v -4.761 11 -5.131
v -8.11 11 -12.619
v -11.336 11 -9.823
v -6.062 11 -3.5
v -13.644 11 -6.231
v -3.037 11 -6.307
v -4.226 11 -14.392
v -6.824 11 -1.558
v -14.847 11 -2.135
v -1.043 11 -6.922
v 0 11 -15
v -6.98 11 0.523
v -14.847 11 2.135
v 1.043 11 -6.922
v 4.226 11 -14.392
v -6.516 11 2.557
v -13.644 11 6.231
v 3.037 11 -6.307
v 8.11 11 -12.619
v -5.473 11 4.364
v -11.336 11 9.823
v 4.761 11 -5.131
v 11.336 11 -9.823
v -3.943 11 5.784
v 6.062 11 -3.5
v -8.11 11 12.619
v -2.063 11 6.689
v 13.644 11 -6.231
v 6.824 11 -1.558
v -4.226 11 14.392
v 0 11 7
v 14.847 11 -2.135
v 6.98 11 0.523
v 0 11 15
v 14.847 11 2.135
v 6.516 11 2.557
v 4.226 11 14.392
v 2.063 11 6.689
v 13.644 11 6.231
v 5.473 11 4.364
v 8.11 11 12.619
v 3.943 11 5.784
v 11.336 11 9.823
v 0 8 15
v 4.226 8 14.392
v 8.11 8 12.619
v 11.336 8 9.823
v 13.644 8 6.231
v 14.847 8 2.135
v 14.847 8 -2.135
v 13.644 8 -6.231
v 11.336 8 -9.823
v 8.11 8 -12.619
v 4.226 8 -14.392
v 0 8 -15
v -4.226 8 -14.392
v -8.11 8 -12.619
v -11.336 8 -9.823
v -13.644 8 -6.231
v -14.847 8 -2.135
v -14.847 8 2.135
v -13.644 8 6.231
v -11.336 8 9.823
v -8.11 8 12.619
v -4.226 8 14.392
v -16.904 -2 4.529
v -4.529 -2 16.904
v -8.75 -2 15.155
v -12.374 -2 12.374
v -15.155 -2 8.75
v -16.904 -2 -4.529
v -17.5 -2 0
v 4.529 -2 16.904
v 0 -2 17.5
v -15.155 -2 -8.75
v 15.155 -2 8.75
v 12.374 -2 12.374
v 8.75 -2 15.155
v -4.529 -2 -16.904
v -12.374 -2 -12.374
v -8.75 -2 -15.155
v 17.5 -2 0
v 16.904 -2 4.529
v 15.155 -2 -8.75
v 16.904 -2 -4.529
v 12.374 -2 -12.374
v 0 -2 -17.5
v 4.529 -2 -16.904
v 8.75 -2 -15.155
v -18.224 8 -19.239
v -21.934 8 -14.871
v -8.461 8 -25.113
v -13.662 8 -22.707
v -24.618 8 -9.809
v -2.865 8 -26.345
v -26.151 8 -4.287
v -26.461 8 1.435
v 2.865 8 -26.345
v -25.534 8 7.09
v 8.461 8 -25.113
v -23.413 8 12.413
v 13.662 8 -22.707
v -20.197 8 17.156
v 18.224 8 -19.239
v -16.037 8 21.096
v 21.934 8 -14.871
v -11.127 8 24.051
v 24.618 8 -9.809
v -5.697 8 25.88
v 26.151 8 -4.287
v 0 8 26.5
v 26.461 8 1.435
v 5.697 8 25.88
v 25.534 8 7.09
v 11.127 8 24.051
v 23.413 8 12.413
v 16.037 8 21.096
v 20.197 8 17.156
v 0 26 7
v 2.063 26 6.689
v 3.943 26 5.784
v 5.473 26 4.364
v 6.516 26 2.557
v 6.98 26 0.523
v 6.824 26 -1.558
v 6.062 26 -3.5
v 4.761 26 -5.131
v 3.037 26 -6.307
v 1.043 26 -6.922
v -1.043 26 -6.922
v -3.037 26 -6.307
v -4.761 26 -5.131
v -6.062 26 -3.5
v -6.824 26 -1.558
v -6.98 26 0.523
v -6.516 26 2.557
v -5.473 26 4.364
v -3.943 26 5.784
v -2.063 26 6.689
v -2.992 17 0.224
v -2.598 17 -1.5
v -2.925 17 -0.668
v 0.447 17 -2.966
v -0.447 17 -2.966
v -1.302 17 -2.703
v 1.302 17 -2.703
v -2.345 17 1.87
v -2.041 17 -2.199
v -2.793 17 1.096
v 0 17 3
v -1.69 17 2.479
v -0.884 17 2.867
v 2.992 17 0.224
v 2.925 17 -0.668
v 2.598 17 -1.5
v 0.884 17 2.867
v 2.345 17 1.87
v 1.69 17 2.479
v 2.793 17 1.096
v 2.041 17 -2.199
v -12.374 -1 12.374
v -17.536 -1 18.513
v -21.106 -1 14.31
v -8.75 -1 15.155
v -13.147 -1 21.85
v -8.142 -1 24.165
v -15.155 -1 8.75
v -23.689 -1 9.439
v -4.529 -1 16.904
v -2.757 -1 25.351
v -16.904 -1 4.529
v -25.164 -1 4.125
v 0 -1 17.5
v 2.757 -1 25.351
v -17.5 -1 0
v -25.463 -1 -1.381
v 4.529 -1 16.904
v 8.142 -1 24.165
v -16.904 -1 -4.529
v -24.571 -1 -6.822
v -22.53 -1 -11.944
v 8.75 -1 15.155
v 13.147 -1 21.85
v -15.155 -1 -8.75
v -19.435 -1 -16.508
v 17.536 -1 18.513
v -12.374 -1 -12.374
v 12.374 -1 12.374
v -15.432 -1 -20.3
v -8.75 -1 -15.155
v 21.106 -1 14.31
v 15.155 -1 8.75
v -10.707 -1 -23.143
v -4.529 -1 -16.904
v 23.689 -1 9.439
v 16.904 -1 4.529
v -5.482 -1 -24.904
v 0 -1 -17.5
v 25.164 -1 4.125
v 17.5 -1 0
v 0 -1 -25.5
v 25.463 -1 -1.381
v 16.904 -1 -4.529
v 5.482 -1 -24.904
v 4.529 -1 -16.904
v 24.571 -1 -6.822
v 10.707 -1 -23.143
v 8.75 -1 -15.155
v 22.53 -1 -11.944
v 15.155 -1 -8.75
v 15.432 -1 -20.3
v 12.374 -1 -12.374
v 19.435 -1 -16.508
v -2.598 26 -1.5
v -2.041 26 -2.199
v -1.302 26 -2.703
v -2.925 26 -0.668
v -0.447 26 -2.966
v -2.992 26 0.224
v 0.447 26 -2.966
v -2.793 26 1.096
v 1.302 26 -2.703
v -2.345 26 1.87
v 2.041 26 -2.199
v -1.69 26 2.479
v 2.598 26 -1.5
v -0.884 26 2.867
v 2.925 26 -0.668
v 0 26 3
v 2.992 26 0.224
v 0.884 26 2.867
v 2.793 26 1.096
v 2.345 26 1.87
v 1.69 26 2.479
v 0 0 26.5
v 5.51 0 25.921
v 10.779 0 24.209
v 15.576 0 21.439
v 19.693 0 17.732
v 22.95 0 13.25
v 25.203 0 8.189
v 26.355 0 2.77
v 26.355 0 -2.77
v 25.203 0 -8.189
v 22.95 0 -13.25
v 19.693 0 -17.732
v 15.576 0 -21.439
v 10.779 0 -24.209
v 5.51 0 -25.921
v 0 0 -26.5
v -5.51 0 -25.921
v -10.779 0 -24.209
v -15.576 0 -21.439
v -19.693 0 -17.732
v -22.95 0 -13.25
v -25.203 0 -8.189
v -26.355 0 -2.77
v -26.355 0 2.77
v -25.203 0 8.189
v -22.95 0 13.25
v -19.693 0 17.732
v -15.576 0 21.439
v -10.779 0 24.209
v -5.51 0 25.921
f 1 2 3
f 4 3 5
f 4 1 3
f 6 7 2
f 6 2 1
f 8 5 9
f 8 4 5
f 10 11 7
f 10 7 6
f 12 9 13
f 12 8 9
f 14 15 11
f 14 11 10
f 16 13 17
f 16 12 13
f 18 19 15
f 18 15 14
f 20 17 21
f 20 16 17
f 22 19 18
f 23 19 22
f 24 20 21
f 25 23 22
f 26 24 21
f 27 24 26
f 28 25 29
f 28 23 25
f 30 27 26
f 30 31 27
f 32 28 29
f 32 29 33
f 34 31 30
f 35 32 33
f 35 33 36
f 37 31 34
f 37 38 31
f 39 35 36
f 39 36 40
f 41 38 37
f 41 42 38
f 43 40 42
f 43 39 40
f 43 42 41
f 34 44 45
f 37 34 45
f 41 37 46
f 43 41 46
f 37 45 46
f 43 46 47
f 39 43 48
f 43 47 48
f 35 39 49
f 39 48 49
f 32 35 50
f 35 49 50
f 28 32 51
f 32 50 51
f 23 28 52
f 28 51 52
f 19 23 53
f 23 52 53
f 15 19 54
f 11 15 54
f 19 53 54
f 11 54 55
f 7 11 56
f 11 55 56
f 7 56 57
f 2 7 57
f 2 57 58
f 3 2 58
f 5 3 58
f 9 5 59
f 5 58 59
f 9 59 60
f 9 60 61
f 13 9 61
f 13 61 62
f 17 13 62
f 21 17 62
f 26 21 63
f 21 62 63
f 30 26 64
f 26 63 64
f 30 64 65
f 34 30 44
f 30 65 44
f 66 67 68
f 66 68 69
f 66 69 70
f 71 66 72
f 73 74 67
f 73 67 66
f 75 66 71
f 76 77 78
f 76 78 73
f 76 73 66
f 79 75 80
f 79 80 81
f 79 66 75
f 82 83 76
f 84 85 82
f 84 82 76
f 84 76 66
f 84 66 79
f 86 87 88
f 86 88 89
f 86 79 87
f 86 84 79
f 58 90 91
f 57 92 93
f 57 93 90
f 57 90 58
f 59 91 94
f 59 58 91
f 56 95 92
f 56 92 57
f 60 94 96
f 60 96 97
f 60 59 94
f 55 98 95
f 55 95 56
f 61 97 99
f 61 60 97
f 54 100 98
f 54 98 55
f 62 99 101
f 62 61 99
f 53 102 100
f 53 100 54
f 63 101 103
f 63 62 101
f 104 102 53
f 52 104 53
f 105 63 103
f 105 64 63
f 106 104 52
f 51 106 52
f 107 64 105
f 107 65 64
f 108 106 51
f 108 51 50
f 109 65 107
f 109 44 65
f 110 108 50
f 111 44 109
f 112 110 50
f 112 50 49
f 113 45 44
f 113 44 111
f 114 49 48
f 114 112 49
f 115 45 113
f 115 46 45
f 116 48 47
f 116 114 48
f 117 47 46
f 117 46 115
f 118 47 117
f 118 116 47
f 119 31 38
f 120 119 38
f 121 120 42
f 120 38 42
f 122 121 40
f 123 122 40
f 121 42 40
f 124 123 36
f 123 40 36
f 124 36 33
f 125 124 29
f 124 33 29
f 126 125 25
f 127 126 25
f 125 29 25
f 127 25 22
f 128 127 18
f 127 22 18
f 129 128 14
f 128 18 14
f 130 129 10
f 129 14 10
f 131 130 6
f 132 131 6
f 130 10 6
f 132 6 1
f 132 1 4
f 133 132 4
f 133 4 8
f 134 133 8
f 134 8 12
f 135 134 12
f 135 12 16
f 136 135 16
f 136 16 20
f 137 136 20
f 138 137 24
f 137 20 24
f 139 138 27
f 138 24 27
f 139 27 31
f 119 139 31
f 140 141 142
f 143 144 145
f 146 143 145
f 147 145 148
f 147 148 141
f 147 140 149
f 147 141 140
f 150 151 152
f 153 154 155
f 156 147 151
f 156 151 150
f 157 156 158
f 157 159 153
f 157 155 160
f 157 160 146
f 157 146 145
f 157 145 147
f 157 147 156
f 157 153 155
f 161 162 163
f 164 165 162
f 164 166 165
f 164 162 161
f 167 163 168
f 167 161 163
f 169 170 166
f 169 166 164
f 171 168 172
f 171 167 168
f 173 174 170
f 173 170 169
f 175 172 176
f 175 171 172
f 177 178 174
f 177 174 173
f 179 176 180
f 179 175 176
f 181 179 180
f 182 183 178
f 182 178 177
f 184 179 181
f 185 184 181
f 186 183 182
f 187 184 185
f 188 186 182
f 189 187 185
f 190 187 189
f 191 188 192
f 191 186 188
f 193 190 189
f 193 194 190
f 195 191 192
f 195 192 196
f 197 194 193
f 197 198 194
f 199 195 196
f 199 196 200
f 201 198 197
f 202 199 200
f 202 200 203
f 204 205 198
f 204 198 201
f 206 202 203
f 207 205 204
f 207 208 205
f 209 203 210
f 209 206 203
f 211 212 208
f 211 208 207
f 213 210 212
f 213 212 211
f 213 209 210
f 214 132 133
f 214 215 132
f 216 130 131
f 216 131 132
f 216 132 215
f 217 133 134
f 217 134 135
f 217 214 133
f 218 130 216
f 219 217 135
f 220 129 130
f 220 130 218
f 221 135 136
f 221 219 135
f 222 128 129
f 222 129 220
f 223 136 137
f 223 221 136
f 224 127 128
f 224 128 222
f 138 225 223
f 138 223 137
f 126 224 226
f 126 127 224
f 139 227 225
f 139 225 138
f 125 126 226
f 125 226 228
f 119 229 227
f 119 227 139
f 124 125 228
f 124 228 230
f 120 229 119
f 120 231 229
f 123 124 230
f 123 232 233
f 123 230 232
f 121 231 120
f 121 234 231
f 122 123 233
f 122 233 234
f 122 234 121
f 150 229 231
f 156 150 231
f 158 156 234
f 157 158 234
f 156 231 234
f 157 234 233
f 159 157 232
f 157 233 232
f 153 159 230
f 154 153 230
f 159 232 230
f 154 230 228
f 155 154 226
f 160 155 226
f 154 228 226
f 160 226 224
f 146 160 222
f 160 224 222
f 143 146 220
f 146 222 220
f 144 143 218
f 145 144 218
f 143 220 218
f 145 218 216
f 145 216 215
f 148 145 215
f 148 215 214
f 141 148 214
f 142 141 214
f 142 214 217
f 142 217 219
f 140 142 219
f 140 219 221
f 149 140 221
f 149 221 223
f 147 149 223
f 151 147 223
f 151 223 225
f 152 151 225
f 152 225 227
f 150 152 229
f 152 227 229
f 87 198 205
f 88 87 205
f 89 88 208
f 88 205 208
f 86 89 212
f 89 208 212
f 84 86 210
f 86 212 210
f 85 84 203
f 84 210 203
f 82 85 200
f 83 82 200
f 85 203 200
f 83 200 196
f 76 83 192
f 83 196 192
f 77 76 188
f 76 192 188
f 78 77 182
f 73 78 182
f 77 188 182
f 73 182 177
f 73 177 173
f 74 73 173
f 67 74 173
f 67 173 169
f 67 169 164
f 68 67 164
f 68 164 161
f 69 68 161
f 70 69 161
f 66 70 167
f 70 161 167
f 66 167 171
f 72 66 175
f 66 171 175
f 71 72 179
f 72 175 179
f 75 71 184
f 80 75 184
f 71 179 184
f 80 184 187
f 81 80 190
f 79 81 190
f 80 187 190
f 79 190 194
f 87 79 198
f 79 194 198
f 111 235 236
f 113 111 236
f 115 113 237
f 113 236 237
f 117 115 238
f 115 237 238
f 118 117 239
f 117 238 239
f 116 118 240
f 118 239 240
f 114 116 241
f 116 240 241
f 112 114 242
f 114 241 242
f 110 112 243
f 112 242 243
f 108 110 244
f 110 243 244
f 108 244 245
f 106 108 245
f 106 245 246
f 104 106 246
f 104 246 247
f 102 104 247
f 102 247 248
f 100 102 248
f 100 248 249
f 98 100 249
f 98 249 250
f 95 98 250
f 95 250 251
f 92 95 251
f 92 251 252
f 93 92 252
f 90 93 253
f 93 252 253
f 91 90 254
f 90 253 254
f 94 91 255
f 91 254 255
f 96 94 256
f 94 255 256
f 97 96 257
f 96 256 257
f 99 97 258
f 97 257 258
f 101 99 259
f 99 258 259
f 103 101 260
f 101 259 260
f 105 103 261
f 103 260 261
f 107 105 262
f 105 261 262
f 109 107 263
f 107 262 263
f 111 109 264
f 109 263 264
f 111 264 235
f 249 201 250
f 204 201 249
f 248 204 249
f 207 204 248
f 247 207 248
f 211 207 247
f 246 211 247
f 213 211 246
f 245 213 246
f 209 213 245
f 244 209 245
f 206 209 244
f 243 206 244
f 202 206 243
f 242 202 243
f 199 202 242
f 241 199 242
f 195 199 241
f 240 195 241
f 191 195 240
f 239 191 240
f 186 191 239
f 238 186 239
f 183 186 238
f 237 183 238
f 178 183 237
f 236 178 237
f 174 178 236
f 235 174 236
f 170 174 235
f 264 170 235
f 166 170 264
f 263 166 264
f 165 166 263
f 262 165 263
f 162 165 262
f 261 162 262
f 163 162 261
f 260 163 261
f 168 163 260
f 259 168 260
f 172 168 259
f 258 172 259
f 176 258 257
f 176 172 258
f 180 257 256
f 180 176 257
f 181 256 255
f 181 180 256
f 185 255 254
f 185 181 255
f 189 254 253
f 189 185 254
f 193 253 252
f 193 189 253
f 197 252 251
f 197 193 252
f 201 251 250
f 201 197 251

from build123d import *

# Parameters (mm, degrees)
CROQUIS2_R              = 26.5
SALIENTE_EXTRUIR1_DEPTH = 8
CROQUIS3_R              = 26.5
SALIENTE_EXTRUIR2_DEPTH = 1
SALIENTE_EXTRUIR2_TAPER = 45
CROQUIS4_R              = 17.5
SALIENTE_EXTRUIR3_DEPTH = 1
CROQUIS5_R              = 15
SALIENTE_EXTRUIR4_DEPTH = 3
CROQUIS6_R              = 7
SALIENTE_EXTRUIR5_DEPTH = 15
CROQUIS7_R              = 3
CORTAR_EXTRUIR1_DEPTH   = 9


with BuildPart() as part:
    # Croquis2 → Saliente-Extruir1 (new body)
    with BuildSketch(Plane(origin=(0, 0, 0), x_dir=(1, 0, 0), z_dir=(0, 1, 0))):
        with Locations(Location((0, 0, 0), (0, 0, 270))):
            Circle(CROQUIS2_R)
    extrude(amount=SALIENTE_EXTRUIR1_DEPTH)

    # Croquis3 → Saliente-Extruir2 (add)
    with BuildSketch(Plane(origin=(0, 0, 0), x_dir=(-1, 0, 0), z_dir=(0, -1, 0))):
        with Locations(Location((0, 0, 0), (0, 0, 90))):
            Circle(CROQUIS3_R)
    extrude(amount=SALIENTE_EXTRUIR2_DEPTH, taper=SALIENTE_EXTRUIR2_TAPER)

    # Croquis4 → Saliente-Extruir3 (add)
    with BuildSketch(Plane(origin=(0, -1, 0), x_dir=(-1, 0, 0), z_dir=(0, -1, 0))):
        with Locations(Location((0, 0, 0), (0, 0, 90))):
            Circle(CROQUIS4_R)
    extrude(amount=SALIENTE_EXTRUIR3_DEPTH)

    # Croquis5 → Saliente-Extruir4 (add)
    with BuildSketch(Plane(origin=(0, 8, 0), x_dir=(1, 0, 0), z_dir=(0, 1, 0))):
        with Locations(Location((0, 0, 0), (0, 0, 270))):
            Circle(CROQUIS5_R)
    extrude(amount=SALIENTE_EXTRUIR4_DEPTH)

    # Croquis6 → Saliente-Extruir5 (add)
    with BuildSketch(Plane(origin=(0, 11, 0), x_dir=(1, 0, 0), z_dir=(0, 1, 0))):
        with Locations(Location((0, 0, 0), (0, 0, 270))):
            Circle(CROQUIS6_R)
    extrude(amount=SALIENTE_EXTRUIR5_DEPTH)

    # Croquis7 → Cortar-Extruir1 (cut)
    with BuildSketch(Plane(origin=(0, 26, 0), x_dir=(1, 0, 0), z_dir=(0, 1, 0))):
        with Locations(Location((0, 0, 0), (0, 0, 270))):
            Circle(CROQUIS7_R)
    extrude(amount=-CORTAR_EXTRUIR1_DEPTH, mode=Mode.SUBTRACT)


solid = part.part
